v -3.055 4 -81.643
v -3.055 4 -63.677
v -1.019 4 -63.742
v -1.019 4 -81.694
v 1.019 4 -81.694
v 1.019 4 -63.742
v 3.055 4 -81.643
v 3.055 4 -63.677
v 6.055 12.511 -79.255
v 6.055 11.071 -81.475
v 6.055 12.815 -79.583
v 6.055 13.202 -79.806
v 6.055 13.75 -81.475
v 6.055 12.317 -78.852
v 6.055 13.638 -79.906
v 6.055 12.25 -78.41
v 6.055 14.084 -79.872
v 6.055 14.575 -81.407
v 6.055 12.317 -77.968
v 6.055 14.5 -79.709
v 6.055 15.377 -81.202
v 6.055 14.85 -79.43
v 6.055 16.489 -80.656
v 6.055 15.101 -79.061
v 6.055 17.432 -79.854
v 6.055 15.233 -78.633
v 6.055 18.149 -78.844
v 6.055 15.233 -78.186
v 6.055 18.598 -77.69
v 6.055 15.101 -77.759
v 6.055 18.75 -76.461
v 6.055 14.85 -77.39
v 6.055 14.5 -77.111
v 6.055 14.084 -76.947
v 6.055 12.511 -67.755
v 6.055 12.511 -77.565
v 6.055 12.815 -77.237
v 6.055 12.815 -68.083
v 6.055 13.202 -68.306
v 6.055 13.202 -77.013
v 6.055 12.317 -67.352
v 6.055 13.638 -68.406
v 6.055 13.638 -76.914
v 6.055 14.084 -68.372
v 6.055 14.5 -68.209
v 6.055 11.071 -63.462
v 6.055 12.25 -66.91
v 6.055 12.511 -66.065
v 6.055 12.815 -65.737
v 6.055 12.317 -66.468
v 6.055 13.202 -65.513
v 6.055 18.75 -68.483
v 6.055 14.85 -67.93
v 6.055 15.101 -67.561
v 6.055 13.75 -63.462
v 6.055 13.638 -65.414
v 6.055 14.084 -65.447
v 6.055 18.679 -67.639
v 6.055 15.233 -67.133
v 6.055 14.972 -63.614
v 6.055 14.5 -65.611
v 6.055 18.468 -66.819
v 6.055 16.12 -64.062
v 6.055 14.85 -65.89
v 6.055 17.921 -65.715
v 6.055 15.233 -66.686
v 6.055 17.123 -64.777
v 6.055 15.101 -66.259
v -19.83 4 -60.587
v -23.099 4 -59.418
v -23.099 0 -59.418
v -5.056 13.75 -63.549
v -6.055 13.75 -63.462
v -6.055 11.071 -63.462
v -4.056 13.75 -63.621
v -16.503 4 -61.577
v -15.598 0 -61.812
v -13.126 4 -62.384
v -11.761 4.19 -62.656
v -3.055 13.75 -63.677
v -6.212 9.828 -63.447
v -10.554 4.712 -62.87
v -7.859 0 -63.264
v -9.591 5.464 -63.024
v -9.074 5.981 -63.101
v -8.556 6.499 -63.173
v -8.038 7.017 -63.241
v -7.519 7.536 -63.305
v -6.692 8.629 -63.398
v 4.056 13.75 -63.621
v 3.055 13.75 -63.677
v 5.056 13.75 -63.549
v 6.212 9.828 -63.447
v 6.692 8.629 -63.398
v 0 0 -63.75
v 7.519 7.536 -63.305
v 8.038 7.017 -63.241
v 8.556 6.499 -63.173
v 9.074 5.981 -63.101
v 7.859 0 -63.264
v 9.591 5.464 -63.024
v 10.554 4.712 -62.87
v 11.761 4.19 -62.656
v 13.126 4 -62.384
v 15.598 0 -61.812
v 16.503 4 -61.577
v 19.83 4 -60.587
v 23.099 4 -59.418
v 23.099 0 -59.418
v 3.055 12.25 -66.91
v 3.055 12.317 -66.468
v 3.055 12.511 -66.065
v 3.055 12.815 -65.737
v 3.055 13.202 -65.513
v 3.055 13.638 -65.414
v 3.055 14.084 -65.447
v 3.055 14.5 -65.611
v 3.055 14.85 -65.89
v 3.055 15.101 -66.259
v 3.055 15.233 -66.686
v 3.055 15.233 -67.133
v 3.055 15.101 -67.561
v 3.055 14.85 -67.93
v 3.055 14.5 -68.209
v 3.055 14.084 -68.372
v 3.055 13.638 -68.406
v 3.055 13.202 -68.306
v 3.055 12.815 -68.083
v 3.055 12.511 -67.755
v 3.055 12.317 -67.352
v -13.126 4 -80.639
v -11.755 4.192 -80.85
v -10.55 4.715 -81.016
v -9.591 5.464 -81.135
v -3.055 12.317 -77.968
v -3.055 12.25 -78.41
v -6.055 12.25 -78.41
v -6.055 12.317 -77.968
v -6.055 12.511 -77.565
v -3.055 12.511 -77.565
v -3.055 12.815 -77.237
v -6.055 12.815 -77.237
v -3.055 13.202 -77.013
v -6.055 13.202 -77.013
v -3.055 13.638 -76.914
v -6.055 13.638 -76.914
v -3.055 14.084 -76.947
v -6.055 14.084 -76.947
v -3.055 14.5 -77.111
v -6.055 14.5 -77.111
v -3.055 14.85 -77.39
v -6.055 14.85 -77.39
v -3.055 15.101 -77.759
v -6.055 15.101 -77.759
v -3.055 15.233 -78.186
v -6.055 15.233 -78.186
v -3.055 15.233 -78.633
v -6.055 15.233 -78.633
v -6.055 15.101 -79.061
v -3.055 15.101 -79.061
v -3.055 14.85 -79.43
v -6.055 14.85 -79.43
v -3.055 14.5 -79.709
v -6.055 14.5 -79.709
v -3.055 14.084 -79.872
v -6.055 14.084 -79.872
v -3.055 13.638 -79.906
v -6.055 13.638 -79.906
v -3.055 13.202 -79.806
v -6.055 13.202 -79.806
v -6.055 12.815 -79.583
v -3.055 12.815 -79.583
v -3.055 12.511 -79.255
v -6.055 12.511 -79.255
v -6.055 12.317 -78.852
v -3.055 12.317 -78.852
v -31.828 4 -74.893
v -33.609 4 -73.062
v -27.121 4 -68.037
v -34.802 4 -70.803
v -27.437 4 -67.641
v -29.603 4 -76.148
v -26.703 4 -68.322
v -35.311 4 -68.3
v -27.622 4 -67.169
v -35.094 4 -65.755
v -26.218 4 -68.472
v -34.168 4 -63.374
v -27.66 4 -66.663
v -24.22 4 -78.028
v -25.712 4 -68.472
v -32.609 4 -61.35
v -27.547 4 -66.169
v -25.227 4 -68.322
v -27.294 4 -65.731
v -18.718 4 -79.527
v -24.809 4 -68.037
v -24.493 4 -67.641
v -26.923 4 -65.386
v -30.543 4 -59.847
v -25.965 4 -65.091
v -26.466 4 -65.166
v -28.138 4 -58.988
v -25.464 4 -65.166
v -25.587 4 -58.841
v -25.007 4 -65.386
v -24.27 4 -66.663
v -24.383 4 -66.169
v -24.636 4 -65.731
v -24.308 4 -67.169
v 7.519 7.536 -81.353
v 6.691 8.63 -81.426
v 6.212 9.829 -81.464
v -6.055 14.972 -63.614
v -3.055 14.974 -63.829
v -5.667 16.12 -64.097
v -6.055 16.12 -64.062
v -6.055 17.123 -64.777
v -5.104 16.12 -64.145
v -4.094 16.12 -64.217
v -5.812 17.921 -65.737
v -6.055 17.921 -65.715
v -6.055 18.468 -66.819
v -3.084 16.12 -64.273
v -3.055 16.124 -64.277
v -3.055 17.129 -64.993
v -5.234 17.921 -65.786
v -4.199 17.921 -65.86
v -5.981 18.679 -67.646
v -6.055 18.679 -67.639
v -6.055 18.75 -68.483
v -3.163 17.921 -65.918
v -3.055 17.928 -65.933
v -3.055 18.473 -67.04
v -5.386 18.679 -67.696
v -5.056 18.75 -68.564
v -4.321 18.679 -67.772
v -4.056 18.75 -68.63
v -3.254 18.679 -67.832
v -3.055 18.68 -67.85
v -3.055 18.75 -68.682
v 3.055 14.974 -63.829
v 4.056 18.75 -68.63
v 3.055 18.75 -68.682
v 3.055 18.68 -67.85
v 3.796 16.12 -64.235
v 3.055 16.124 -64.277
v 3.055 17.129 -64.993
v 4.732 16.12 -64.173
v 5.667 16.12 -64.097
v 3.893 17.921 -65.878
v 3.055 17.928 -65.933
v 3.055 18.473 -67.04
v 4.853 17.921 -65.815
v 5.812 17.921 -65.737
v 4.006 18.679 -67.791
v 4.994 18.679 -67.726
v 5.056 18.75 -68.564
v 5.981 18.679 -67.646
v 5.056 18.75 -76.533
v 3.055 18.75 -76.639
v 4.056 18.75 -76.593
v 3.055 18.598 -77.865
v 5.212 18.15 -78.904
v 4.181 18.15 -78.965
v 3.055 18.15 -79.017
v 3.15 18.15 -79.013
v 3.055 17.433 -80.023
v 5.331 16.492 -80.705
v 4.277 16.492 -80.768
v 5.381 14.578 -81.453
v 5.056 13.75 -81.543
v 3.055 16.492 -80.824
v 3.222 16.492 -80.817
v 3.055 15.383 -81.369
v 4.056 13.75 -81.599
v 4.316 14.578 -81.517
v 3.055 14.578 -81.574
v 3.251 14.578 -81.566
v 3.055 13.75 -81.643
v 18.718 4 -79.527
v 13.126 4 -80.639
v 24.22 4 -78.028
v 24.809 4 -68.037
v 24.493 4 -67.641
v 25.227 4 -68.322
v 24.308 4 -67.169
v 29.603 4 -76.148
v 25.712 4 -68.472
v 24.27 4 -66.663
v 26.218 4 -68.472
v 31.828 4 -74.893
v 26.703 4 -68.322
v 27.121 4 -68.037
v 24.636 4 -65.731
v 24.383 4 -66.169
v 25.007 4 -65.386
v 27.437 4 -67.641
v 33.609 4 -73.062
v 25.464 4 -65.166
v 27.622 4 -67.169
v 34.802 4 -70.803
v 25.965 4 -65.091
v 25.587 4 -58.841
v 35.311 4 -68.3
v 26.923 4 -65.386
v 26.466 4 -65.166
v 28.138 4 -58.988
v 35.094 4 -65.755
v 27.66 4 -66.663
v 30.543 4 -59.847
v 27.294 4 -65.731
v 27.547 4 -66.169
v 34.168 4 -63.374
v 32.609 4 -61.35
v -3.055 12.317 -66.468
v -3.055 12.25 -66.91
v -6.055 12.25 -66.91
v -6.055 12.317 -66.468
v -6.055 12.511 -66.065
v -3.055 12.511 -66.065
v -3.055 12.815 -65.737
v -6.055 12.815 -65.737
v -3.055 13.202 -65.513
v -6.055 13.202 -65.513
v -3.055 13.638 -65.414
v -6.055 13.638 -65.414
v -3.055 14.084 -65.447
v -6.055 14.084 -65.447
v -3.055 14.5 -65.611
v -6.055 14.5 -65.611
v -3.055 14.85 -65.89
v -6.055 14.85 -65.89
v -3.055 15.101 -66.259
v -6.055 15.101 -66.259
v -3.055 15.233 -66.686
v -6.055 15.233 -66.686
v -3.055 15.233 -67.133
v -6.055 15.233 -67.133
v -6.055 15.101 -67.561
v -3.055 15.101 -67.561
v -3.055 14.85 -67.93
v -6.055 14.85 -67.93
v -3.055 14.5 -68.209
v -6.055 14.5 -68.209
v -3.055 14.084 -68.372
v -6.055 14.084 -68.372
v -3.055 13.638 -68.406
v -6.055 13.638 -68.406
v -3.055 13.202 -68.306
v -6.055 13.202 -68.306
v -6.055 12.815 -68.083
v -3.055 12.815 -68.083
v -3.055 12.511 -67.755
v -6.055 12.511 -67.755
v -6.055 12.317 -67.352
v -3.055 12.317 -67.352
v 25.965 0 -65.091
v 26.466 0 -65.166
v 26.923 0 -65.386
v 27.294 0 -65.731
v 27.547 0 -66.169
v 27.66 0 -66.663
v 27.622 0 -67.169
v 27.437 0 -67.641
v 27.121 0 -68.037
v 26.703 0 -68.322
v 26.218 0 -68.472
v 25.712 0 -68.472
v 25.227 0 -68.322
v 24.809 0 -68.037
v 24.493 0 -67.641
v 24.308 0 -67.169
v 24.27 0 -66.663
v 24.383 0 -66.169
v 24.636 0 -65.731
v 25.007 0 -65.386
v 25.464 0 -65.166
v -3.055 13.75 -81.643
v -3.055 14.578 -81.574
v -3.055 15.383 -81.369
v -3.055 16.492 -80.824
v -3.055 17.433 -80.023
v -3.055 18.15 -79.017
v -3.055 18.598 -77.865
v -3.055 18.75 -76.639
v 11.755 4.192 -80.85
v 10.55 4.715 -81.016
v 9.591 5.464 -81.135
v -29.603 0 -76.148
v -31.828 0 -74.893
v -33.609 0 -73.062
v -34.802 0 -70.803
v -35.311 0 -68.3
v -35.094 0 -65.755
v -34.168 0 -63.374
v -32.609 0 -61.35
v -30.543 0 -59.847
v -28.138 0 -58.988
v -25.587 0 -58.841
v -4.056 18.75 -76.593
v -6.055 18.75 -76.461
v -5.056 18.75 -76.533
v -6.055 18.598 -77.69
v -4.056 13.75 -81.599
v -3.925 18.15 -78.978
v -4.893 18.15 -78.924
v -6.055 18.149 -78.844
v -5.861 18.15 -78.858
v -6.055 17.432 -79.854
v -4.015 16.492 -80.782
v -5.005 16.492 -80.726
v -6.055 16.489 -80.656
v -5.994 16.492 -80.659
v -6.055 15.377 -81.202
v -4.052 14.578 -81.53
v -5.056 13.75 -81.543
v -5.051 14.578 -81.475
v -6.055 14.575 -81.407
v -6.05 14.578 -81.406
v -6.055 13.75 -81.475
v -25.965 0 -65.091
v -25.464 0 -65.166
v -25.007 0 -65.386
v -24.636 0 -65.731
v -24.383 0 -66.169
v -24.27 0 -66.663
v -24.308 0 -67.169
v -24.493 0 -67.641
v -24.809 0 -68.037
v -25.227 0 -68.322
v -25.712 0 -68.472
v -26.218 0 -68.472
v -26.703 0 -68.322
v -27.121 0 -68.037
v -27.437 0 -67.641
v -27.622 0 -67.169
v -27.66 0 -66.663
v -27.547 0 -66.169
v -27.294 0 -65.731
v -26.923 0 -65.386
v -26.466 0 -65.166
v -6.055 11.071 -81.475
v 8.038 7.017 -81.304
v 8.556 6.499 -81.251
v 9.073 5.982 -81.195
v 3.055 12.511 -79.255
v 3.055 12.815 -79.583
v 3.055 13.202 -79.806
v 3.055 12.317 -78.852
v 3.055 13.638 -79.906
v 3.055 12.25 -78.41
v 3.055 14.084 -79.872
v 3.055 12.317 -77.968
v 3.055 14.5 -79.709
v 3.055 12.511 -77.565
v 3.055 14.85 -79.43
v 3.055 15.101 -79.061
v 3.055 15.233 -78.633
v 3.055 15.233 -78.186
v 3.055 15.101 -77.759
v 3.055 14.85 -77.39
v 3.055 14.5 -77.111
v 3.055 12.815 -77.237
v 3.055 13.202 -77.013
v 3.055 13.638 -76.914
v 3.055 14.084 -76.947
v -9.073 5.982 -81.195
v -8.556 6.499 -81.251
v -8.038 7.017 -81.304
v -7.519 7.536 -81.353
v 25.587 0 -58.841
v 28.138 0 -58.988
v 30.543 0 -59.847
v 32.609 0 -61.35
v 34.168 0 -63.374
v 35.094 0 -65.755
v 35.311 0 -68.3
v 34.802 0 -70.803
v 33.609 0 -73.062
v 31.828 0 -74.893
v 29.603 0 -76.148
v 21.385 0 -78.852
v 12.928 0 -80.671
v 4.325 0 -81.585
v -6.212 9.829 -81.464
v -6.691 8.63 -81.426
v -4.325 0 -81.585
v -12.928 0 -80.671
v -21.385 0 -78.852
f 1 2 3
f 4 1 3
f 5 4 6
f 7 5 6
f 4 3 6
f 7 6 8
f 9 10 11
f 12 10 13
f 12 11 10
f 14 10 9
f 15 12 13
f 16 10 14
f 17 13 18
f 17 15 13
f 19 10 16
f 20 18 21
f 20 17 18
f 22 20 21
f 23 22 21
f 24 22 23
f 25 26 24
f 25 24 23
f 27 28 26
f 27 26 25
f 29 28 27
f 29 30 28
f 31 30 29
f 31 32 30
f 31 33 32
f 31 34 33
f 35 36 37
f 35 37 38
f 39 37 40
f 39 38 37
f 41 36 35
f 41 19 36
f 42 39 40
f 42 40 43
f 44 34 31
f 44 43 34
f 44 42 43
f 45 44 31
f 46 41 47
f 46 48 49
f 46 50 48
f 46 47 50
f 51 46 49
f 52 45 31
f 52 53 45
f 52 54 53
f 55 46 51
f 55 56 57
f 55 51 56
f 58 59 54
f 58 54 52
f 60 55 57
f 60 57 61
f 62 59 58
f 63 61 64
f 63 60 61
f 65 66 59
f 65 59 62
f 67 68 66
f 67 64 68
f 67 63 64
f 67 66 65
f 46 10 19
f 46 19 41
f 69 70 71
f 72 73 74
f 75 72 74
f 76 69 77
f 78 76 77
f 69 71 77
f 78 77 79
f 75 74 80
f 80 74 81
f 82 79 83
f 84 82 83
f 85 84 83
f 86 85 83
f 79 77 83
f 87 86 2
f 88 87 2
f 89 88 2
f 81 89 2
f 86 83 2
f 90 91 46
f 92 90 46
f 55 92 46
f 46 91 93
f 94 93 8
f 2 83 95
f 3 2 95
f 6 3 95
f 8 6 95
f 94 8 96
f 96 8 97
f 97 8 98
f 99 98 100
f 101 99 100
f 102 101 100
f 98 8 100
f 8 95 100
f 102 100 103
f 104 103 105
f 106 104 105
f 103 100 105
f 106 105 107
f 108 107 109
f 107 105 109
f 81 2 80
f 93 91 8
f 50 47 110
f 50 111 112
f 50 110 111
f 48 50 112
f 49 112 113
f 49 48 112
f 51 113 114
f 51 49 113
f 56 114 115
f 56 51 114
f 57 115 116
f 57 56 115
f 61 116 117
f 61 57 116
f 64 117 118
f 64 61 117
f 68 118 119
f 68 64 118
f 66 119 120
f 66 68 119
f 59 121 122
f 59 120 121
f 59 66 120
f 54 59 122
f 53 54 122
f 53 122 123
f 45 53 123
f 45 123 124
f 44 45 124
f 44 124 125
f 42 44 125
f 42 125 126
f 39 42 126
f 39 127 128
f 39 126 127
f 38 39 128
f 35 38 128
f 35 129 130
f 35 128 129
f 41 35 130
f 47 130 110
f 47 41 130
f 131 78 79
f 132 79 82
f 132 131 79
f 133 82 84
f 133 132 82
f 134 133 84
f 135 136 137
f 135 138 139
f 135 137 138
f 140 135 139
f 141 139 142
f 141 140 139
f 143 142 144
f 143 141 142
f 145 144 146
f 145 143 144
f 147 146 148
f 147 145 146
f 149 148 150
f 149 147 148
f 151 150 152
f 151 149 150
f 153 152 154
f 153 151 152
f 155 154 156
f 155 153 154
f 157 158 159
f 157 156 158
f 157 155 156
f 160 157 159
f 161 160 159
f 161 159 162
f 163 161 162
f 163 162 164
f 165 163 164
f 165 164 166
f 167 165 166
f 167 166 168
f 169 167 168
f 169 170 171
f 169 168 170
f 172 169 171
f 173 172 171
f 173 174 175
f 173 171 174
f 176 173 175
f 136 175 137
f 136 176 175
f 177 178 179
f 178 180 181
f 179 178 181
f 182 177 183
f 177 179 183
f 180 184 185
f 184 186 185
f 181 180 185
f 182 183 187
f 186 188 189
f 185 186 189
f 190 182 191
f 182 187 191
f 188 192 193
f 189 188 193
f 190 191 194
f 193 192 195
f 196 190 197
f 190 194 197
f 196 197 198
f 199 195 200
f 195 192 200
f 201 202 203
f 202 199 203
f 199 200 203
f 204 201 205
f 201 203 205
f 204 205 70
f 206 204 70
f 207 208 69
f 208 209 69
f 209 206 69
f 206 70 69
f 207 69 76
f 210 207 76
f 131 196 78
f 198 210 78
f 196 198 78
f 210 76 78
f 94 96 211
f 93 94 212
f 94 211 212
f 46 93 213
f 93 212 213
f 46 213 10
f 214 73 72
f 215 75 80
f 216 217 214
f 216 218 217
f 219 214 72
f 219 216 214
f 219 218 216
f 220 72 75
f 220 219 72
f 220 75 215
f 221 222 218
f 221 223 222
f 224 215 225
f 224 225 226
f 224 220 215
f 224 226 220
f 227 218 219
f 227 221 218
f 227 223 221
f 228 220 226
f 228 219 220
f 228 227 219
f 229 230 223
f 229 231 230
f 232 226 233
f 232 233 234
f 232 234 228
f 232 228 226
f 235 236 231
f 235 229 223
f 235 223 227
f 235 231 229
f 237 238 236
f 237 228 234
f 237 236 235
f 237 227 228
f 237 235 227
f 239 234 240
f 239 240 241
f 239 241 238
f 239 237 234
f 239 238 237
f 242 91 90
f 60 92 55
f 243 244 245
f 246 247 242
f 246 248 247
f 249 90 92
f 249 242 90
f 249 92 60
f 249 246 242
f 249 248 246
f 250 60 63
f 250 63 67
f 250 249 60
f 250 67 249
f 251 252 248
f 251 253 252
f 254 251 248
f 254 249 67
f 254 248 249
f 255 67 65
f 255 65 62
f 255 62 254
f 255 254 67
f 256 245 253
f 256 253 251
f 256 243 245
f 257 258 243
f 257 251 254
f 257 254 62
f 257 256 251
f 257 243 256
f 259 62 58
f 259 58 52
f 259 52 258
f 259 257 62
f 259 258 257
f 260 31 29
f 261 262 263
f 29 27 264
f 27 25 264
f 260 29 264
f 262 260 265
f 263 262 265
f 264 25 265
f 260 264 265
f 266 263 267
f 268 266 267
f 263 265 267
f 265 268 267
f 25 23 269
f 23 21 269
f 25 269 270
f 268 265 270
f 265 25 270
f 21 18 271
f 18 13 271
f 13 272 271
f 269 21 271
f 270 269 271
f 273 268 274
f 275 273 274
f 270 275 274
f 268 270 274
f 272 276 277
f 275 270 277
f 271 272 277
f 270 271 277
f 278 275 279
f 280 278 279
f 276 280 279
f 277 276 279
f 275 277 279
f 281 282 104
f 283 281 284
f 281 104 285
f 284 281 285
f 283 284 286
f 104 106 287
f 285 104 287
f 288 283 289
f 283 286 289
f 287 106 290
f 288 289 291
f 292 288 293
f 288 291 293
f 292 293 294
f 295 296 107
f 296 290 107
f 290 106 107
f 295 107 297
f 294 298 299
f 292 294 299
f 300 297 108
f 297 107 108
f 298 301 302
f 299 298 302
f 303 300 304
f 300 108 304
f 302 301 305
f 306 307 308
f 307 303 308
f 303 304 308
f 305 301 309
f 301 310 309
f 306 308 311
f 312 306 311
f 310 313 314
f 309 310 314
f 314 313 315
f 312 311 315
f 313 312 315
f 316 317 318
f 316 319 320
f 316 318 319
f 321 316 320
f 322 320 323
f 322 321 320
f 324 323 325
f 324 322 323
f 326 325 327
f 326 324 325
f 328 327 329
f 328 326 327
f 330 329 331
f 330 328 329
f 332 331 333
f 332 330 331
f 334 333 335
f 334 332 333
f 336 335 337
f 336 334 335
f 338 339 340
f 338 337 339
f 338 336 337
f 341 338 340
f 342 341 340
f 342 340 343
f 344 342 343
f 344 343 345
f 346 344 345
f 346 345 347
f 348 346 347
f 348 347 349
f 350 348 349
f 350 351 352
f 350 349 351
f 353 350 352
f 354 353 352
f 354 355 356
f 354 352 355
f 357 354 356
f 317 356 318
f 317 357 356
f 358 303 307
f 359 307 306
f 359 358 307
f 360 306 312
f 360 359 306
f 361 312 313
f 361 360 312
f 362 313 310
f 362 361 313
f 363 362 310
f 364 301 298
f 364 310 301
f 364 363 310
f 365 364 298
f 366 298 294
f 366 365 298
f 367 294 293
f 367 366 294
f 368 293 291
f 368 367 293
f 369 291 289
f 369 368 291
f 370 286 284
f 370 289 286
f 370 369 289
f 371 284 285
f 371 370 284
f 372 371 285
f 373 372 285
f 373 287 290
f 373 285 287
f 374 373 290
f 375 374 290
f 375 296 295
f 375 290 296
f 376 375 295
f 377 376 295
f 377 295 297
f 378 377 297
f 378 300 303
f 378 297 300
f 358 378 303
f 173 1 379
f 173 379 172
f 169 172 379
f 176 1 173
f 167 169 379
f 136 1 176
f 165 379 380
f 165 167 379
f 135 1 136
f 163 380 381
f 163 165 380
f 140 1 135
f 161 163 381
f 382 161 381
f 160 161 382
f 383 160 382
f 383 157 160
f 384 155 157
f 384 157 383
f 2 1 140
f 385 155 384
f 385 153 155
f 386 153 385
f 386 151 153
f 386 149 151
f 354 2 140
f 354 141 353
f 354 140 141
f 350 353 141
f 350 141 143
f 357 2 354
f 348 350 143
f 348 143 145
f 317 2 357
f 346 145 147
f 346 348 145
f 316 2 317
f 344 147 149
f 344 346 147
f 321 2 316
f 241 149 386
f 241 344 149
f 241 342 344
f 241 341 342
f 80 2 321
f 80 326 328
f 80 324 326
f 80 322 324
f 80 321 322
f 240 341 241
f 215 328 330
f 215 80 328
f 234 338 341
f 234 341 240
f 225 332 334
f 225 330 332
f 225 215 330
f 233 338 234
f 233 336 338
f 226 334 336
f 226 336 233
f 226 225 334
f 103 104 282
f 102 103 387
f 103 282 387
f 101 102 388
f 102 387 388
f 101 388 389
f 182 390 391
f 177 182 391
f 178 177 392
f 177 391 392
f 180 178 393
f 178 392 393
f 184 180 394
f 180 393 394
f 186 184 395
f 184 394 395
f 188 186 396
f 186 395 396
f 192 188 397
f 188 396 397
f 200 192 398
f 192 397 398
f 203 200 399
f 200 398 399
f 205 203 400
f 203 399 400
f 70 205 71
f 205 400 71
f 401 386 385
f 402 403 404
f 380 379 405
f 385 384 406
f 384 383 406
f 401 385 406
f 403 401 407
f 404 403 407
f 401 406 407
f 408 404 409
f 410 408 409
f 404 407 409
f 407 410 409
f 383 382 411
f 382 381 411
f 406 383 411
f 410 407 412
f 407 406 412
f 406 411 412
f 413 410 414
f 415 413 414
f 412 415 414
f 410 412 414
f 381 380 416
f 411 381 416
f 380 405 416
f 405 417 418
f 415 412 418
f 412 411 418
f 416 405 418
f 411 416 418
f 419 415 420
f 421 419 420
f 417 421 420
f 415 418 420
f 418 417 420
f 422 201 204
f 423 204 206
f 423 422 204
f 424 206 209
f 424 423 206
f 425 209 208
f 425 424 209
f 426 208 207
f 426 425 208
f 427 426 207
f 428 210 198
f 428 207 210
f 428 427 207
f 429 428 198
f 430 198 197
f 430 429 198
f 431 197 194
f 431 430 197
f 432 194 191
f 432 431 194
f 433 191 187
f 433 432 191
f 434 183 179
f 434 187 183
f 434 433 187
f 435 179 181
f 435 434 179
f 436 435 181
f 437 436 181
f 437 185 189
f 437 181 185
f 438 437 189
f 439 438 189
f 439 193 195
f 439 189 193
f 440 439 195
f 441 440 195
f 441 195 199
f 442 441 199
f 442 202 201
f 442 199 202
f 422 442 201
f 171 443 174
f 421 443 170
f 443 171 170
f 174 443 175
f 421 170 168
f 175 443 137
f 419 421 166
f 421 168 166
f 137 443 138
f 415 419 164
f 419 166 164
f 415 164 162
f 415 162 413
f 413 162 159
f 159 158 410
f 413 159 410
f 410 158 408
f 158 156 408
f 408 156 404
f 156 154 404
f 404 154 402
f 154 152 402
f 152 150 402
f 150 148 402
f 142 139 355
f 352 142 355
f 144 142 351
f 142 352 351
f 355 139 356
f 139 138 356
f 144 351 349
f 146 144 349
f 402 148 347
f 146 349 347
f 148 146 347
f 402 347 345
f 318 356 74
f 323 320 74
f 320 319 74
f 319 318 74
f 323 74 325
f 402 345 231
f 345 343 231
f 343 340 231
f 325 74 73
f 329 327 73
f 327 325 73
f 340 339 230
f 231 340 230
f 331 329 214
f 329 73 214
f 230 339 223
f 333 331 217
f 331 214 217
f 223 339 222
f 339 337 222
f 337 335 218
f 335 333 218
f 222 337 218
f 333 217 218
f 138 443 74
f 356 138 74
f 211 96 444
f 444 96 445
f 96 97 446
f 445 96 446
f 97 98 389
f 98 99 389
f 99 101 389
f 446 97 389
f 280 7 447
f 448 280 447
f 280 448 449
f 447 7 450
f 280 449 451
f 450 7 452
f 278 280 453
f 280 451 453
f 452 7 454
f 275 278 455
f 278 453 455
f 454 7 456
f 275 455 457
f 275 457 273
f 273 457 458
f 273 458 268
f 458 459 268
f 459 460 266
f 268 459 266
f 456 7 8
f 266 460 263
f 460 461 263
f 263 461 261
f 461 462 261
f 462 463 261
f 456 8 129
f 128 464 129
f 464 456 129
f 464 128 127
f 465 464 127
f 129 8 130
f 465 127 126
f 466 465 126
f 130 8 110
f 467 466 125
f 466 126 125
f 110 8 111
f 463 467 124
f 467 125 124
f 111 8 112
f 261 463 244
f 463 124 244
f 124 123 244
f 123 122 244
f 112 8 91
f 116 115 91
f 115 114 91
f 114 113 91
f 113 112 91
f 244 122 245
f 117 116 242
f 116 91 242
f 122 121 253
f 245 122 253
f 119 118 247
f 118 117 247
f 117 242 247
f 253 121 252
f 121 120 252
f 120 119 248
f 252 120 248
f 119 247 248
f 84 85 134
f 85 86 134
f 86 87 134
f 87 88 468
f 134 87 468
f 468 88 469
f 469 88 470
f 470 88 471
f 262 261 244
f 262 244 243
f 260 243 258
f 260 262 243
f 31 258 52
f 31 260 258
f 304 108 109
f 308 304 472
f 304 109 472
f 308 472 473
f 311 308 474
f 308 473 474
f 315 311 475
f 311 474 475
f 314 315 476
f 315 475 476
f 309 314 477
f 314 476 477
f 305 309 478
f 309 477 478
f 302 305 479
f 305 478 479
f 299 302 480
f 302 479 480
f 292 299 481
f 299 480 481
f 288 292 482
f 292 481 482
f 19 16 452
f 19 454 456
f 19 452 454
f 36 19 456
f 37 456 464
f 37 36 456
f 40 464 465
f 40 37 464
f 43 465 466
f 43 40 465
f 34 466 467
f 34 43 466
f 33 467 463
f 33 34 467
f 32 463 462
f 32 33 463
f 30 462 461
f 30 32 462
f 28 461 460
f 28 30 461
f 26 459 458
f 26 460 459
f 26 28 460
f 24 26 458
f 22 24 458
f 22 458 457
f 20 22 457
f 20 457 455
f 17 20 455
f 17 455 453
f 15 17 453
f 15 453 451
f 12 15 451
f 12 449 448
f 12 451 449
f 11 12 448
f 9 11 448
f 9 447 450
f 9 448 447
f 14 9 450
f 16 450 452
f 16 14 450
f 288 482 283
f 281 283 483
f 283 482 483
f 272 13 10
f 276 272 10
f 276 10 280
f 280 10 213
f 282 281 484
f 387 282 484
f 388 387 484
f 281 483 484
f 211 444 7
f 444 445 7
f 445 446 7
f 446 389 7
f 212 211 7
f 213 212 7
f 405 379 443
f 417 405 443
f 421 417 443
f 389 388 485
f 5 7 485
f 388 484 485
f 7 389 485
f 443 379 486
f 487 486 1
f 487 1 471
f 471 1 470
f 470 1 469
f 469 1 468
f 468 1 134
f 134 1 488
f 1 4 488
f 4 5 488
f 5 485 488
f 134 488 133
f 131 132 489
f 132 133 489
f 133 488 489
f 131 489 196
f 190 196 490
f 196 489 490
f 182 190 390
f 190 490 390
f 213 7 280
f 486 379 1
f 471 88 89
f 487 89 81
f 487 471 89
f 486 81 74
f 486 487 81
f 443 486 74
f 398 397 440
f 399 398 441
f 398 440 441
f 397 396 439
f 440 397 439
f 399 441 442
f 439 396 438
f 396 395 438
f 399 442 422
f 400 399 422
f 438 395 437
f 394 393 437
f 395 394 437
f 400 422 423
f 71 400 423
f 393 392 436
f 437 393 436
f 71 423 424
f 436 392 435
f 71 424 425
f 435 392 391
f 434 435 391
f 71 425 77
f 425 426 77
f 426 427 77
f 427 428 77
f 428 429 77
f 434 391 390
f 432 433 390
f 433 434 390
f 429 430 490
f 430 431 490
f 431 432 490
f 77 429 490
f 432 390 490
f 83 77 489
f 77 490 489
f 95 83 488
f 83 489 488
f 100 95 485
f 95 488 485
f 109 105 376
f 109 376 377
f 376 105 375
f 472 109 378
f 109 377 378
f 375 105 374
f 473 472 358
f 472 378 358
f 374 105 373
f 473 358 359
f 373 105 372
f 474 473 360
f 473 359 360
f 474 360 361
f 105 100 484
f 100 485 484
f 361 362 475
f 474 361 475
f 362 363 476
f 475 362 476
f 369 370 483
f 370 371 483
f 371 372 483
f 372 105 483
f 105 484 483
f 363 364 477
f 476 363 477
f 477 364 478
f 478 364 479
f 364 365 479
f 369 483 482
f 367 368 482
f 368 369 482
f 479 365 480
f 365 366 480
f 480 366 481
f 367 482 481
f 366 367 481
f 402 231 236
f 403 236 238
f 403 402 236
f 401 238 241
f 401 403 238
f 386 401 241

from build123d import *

# Parameters (mm, degrees)
SKETCH1_R               = 1.7
BOSS_EXTRUDE1_DEPTH     = 18.75
SKETCH2_W               = 29.270887873
SKETCH2_H               = 14.75
SKETCH2_W_2             = 6.11
CUT_EXTRUDE1_DEPTH      = 91.963568829
CHAMFER1_SIZE           = 5
FILLET1_R               = 5
CUT_EXTRUDE2_DEPTH      = 93.192977357
CUT_EXTRUDE2_DEPTH_BACK = 93.192977357
SKETCH4_R               = 1.5
FILLET2_R               = 5


with BuildPart() as part:
    # Sketch1 → Boss-Extrude1 (new body)
    with BuildSketch(Plane(origin=(0, 0, 0), x_dir=(1, 0, 0), z_dir=(0, 1, 0))):
        with BuildLine():
            ThreePointArc((-23.098921993, 59.418030115), (0, 63.75), (23.098921993, 59.418030115))
            ThreePointArc((23.098921993, 59.418030115), (34.716014466, 64.531190827), (29.602853754, 76.148283301))
            ThreePointArc((29.602853754, 76.148283301), (0, 81.7), (-29.602853754, 76.148283301))
            ThreePointArc((-29.602853754, 76.148283301), (-34.716014466, 64.531190827), (-23.098921993, 59.418030115))
        make_face()
        with Locations(Location((-25.965, 66.790526087, 0), (0, 0, 270))):
            Circle(SKETCH1_R, mode=Mode.SUBTRACT)
        with Locations(Location((25.965, 66.790526087, 0), (0, 0, 270))):
            Circle(SKETCH1_R, mode=Mode.SUBTRACT)
    extrude(amount=BOSS_EXTRUDE1_DEPTH)

    # Sketch2 → Cut-Extrude1 (cut, through all)
    with BuildSketch(Plane.XY):
        with Locations((-20.690443936, 11.375)):
            Rectangle(SKETCH2_W, SKETCH2_H)
        with Locations((20.690443936, 11.375)):
            Rectangle(SKETCH2_W, SKETCH2_H)
        with Locations((0, 11.375)):
            Rectangle(SKETCH2_W_2, SKETCH2_H)
    extrude(amount=-CUT_EXTRUDE1_DEPTH, mode=Mode.SUBTRACT)

    # Chamfer1
    chamfer1_edges = [part.edges().sort_by_distance(p)[0] for p in [
        (-6.055, 4, -72.468555262),
        (6.055, 4, -72.468555262),
    ]]
    chamfer(chamfer1_edges, length=CHAMFER1_SIZE)

    # Fillet1
    fillet1_edges = [part.edges().sort_by_distance(p)[0] for p in [
        (11.055, 4, -71.866378435),
        (6.055, 9, -72.468555262),
        (-11.055, 4, -71.866378435),
        (-6.055, 9, -72.468555262),
    ]]
    fillet(fillet1_edges, radius=FILLET1_R)

    # Sketch4 → Cut-Extrude2 (cut, two sides: drawn at the far end of the back side and taken through both)
    with BuildSketch(Plane.ZY.offset(-3.055).offset(-CUT_EXTRUDE2_DEPTH_BACK)):
        with Locations(Location((-78.409810047, 13.75, 0), (0, 0, 270))):
            Circle(SKETCH4_R)
        with Locations(Location((-66.909810047, 13.75, 0), (0, 0, 270))):
            Circle(SKETCH4_R)
    extrude(amount=CUT_EXTRUDE2_DEPTH + CUT_EXTRUDE2_DEPTH_BACK, mode=Mode.SUBTRACT)

    # Fillet2
    fillet2_edges = [part.edges().sort_by_distance(p)[0] for p in [
        (4.555770299, 18.75, -81.57288126),
        (-4.555770299, 18.75, -81.57288126),
        (-4.556267903, 18.75, -63.586971329),
        (4.556267903, 18.75, -63.586971329),
    ]]
    fillet(fillet2_edges, radius=FILLET2_R)


solid = part.part
